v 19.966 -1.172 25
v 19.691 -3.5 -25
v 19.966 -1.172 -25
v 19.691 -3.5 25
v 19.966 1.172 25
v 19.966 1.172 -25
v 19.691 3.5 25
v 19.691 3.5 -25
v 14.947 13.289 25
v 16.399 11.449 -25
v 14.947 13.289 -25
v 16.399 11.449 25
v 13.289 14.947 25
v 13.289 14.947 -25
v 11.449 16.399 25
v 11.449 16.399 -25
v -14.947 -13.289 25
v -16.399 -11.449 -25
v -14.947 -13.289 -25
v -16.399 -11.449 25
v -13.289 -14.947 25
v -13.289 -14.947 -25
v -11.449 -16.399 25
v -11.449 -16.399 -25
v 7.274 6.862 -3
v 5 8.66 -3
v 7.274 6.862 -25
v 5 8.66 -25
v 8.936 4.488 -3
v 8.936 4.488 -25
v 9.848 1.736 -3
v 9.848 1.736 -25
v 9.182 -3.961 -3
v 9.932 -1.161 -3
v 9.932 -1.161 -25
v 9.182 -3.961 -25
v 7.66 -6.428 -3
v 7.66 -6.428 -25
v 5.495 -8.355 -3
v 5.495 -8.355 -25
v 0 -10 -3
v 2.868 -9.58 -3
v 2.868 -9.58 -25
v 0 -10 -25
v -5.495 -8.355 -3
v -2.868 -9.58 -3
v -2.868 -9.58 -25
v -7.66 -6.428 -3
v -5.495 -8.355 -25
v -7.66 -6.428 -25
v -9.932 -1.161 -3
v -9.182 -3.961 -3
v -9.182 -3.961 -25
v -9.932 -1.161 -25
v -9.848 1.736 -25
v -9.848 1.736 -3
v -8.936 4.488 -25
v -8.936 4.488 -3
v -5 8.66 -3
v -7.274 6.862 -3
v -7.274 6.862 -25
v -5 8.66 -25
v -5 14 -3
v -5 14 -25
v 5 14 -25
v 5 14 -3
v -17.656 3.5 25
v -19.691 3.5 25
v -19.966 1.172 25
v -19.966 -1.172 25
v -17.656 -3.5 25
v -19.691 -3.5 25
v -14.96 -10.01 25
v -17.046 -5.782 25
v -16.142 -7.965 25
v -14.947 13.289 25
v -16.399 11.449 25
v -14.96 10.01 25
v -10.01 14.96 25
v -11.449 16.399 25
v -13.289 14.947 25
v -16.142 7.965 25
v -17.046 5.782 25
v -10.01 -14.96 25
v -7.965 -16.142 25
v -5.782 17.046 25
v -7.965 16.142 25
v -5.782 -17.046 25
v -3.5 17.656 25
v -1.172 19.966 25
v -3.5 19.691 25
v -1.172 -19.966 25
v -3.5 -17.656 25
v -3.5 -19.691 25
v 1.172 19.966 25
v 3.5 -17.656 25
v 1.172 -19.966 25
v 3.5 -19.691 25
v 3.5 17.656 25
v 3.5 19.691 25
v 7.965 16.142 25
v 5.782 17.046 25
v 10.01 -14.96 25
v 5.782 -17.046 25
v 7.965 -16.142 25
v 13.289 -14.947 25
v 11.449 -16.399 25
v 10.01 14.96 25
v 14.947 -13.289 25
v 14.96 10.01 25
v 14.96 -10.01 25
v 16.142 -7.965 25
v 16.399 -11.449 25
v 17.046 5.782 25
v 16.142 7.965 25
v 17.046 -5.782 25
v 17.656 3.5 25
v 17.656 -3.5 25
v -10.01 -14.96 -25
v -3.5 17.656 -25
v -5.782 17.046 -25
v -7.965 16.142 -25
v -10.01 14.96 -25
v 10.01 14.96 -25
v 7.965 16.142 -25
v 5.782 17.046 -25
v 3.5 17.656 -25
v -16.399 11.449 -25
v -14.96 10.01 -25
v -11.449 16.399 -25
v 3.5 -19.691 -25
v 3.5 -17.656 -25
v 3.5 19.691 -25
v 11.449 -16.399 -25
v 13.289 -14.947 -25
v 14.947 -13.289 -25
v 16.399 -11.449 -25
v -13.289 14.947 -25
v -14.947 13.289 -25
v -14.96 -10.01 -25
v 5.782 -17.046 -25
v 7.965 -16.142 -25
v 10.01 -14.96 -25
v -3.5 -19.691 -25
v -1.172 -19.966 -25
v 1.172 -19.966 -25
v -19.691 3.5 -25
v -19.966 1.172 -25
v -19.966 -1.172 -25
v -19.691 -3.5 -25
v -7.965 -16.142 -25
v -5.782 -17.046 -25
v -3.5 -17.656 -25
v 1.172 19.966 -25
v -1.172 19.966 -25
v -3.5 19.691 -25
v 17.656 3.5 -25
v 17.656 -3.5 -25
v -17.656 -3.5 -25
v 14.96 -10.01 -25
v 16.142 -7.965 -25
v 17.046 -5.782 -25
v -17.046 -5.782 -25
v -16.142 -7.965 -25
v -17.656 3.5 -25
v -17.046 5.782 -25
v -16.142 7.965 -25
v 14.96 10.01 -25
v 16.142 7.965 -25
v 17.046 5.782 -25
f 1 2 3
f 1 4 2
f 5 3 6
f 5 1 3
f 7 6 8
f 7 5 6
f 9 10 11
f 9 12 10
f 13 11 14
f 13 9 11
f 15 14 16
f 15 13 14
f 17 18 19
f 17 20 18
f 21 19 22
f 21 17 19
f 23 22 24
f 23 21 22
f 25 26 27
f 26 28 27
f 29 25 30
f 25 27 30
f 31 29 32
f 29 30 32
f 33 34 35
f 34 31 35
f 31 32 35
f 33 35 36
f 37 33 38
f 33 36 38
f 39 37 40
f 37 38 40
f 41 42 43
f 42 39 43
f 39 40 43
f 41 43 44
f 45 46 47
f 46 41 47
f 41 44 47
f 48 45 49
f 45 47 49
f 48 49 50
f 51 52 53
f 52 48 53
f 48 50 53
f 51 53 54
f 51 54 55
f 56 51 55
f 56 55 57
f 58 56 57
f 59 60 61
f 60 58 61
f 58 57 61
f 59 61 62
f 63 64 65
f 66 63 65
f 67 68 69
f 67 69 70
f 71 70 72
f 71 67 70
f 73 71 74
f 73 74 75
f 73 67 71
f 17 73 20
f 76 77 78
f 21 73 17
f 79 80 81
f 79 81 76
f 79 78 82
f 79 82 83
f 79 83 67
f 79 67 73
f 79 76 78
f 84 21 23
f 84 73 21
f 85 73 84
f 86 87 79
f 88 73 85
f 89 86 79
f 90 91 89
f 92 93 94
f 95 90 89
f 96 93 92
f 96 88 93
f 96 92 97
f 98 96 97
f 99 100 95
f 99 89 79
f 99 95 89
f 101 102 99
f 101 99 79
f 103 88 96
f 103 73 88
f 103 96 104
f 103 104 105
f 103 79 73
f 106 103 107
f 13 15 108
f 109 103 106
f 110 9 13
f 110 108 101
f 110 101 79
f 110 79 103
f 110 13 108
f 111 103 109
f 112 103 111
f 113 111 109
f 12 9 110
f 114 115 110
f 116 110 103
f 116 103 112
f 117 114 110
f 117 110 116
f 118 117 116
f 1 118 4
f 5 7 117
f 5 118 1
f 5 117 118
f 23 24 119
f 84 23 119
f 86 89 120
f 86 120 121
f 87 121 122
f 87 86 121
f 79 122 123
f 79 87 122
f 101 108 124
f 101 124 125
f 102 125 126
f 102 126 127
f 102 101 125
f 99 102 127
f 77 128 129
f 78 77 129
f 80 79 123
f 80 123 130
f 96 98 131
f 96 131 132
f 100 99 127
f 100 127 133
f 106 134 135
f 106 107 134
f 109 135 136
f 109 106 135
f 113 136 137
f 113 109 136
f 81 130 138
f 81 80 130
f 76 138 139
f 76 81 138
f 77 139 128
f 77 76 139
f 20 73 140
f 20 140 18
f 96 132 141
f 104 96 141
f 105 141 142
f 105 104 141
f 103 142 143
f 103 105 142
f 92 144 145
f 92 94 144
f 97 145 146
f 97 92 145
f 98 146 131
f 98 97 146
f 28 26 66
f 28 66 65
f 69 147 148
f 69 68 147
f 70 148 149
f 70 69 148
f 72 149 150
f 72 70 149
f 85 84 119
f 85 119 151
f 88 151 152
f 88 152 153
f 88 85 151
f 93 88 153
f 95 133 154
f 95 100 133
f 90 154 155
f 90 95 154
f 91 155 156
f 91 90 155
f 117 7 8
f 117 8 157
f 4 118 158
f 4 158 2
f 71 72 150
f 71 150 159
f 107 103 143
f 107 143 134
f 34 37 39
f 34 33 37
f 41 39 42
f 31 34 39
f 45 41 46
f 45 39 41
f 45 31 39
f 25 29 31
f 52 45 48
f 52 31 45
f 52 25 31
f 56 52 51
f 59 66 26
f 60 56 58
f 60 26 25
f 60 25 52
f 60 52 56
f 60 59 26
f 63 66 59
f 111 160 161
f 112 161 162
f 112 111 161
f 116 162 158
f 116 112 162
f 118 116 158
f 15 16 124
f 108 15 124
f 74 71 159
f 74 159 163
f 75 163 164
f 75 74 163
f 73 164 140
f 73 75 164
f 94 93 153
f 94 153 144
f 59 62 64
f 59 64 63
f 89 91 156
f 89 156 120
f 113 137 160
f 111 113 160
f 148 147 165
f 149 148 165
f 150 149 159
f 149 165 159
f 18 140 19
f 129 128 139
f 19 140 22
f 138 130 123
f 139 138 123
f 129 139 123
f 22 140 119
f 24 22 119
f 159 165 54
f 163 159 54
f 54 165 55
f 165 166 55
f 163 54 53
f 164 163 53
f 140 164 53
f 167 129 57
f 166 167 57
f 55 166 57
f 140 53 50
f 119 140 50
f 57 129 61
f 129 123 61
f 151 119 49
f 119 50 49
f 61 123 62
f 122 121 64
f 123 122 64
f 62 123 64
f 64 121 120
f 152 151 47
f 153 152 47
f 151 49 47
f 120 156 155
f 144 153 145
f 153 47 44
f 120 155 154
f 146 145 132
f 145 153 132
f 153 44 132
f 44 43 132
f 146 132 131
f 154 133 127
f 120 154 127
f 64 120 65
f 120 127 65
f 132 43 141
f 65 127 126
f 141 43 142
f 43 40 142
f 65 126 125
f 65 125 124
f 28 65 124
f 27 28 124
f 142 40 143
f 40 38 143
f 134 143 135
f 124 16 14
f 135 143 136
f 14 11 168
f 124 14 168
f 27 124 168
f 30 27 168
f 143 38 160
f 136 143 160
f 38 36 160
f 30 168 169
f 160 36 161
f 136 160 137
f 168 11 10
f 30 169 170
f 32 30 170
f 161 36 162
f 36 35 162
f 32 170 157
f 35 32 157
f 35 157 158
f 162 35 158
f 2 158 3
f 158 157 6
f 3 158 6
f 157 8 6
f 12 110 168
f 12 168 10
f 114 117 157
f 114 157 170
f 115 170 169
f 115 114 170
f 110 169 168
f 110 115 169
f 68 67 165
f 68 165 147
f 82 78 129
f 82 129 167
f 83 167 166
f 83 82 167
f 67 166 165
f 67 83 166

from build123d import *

# Parameters (mm, degrees)
SKETCH1_R           = 18
BASEKEY_DEPTH       = 25
RECTANGLE_DEPTH     = 25
RECTANGLEPAT_COUNT  = 8
SKETCH_1_R          = 10
CUT_EXTRUDE_1_DEPTH = 22
CUT_EXTRUDE_2_DEPTH = 14


with BuildPart() as part:
    # Sketch1 → BaseKey (new, symmetric)
    with BuildSketch(Plane.XY):
        Circle(SKETCH1_R)
    extrude(amount=BASEKEY_DEPTH, both=True)

    # Sketch2 → Rectangle (add, symmetric)
    with BuildSketch(Plane.XY):
        with BuildLine():
            Line((-3.5, 19.691368668), (-3.5, 0))
            Line((-3.5, 0), (3.5, 0))
            Line((3.5, 0), (3.5, 19.691368668))
            ThreePointArc((3.5, 19.691368668), (0, 20), (-3.5, 19.691368668))
        make_face()
    rectangle = extrude(amount=RECTANGLE_DEPTH, both=True)

    # RectanglePat: Rectangle ×8 about axis
    rectanglepat_axis = Axis((0, 0, 0), (0, 0, 1))
    for i in range(1, RECTANGLEPAT_COUNT):
        add(rectangle.rotate(rectanglepat_axis, i * 360 / RECTANGLEPAT_COUNT))

    # 草图1 → 切除-拉伸1 (cut)
    with BuildSketch(Plane(origin=(0, 0, -25), x_dir=(-1, 0, 0), z_dir=(0, 0, -1))):
        Circle(SKETCH_1_R)
    extrude(amount=-CUT_EXTRUDE_1_DEPTH, mode=Mode.SUBTRACT)

    # 草图3 → 切除-拉伸2 (cut)
    with BuildSketch(Plane(origin=(0, 0, 0), x_dir=(1, 0, 0), z_dir=(0, 1, 0))):
        Polygon((5, 25), (-5, 25), (-5, 18), (-5, 3), (5, 3), (5, 18), align=None)
    extrude(amount=CUT_EXTRUDE_2_DEPTH, mode=Mode.SUBTRACT)


solid = part.part
